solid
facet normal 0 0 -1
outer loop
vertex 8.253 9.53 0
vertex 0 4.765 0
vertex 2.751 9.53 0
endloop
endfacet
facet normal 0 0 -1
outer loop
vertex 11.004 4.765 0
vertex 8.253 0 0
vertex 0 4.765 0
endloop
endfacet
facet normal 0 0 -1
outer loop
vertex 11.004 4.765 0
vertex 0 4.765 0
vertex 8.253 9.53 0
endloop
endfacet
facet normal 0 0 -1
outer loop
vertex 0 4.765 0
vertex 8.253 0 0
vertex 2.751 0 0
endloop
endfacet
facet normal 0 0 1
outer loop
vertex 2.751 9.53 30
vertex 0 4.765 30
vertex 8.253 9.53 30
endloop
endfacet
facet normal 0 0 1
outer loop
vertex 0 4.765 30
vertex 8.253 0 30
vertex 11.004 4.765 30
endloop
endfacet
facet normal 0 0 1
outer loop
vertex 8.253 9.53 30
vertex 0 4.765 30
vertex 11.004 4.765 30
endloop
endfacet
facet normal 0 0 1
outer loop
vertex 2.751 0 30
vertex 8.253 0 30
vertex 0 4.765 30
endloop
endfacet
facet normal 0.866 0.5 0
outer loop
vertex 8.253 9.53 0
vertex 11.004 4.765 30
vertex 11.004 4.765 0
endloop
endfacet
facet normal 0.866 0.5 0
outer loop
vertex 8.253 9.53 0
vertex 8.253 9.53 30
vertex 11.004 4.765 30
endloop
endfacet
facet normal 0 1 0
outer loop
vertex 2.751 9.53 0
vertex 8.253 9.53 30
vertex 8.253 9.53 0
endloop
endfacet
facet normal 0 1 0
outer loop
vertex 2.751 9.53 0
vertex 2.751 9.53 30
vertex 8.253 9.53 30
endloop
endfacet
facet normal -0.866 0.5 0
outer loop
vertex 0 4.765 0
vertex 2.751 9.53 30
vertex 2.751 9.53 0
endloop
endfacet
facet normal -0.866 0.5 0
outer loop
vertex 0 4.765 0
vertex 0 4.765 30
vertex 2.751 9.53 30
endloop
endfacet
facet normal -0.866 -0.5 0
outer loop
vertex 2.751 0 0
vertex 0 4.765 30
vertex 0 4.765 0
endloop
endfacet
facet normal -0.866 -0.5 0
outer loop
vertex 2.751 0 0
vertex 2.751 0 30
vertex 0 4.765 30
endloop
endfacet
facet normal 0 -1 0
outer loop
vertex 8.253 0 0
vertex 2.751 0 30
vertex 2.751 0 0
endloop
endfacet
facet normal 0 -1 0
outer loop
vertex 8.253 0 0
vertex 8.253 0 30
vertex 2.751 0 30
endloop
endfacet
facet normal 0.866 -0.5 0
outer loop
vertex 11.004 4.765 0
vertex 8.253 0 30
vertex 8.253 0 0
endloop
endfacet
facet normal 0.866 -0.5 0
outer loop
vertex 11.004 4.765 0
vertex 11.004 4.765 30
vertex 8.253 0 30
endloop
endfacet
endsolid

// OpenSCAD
$fn = 32;

// ----------------------------------------------------------------------
// Key bar: hex key, 30 mm thick
// ----------------------------------------------------------------------

// --- parameters (mm) ---
profile_height = 30;      // extrusion height
profile_points = 6;       // points of the closed outline

profile = [[11.004, 4.765], [8.253, 9.53], [2.751, 9.53], [0, 4.765], [2.751, 0], [8.253, 0]];  // single closed polygon, 6 points, counter clockwise

// --- the one profile operation ---
linear_extrude(height = profile_height) polygon(points = profile);
